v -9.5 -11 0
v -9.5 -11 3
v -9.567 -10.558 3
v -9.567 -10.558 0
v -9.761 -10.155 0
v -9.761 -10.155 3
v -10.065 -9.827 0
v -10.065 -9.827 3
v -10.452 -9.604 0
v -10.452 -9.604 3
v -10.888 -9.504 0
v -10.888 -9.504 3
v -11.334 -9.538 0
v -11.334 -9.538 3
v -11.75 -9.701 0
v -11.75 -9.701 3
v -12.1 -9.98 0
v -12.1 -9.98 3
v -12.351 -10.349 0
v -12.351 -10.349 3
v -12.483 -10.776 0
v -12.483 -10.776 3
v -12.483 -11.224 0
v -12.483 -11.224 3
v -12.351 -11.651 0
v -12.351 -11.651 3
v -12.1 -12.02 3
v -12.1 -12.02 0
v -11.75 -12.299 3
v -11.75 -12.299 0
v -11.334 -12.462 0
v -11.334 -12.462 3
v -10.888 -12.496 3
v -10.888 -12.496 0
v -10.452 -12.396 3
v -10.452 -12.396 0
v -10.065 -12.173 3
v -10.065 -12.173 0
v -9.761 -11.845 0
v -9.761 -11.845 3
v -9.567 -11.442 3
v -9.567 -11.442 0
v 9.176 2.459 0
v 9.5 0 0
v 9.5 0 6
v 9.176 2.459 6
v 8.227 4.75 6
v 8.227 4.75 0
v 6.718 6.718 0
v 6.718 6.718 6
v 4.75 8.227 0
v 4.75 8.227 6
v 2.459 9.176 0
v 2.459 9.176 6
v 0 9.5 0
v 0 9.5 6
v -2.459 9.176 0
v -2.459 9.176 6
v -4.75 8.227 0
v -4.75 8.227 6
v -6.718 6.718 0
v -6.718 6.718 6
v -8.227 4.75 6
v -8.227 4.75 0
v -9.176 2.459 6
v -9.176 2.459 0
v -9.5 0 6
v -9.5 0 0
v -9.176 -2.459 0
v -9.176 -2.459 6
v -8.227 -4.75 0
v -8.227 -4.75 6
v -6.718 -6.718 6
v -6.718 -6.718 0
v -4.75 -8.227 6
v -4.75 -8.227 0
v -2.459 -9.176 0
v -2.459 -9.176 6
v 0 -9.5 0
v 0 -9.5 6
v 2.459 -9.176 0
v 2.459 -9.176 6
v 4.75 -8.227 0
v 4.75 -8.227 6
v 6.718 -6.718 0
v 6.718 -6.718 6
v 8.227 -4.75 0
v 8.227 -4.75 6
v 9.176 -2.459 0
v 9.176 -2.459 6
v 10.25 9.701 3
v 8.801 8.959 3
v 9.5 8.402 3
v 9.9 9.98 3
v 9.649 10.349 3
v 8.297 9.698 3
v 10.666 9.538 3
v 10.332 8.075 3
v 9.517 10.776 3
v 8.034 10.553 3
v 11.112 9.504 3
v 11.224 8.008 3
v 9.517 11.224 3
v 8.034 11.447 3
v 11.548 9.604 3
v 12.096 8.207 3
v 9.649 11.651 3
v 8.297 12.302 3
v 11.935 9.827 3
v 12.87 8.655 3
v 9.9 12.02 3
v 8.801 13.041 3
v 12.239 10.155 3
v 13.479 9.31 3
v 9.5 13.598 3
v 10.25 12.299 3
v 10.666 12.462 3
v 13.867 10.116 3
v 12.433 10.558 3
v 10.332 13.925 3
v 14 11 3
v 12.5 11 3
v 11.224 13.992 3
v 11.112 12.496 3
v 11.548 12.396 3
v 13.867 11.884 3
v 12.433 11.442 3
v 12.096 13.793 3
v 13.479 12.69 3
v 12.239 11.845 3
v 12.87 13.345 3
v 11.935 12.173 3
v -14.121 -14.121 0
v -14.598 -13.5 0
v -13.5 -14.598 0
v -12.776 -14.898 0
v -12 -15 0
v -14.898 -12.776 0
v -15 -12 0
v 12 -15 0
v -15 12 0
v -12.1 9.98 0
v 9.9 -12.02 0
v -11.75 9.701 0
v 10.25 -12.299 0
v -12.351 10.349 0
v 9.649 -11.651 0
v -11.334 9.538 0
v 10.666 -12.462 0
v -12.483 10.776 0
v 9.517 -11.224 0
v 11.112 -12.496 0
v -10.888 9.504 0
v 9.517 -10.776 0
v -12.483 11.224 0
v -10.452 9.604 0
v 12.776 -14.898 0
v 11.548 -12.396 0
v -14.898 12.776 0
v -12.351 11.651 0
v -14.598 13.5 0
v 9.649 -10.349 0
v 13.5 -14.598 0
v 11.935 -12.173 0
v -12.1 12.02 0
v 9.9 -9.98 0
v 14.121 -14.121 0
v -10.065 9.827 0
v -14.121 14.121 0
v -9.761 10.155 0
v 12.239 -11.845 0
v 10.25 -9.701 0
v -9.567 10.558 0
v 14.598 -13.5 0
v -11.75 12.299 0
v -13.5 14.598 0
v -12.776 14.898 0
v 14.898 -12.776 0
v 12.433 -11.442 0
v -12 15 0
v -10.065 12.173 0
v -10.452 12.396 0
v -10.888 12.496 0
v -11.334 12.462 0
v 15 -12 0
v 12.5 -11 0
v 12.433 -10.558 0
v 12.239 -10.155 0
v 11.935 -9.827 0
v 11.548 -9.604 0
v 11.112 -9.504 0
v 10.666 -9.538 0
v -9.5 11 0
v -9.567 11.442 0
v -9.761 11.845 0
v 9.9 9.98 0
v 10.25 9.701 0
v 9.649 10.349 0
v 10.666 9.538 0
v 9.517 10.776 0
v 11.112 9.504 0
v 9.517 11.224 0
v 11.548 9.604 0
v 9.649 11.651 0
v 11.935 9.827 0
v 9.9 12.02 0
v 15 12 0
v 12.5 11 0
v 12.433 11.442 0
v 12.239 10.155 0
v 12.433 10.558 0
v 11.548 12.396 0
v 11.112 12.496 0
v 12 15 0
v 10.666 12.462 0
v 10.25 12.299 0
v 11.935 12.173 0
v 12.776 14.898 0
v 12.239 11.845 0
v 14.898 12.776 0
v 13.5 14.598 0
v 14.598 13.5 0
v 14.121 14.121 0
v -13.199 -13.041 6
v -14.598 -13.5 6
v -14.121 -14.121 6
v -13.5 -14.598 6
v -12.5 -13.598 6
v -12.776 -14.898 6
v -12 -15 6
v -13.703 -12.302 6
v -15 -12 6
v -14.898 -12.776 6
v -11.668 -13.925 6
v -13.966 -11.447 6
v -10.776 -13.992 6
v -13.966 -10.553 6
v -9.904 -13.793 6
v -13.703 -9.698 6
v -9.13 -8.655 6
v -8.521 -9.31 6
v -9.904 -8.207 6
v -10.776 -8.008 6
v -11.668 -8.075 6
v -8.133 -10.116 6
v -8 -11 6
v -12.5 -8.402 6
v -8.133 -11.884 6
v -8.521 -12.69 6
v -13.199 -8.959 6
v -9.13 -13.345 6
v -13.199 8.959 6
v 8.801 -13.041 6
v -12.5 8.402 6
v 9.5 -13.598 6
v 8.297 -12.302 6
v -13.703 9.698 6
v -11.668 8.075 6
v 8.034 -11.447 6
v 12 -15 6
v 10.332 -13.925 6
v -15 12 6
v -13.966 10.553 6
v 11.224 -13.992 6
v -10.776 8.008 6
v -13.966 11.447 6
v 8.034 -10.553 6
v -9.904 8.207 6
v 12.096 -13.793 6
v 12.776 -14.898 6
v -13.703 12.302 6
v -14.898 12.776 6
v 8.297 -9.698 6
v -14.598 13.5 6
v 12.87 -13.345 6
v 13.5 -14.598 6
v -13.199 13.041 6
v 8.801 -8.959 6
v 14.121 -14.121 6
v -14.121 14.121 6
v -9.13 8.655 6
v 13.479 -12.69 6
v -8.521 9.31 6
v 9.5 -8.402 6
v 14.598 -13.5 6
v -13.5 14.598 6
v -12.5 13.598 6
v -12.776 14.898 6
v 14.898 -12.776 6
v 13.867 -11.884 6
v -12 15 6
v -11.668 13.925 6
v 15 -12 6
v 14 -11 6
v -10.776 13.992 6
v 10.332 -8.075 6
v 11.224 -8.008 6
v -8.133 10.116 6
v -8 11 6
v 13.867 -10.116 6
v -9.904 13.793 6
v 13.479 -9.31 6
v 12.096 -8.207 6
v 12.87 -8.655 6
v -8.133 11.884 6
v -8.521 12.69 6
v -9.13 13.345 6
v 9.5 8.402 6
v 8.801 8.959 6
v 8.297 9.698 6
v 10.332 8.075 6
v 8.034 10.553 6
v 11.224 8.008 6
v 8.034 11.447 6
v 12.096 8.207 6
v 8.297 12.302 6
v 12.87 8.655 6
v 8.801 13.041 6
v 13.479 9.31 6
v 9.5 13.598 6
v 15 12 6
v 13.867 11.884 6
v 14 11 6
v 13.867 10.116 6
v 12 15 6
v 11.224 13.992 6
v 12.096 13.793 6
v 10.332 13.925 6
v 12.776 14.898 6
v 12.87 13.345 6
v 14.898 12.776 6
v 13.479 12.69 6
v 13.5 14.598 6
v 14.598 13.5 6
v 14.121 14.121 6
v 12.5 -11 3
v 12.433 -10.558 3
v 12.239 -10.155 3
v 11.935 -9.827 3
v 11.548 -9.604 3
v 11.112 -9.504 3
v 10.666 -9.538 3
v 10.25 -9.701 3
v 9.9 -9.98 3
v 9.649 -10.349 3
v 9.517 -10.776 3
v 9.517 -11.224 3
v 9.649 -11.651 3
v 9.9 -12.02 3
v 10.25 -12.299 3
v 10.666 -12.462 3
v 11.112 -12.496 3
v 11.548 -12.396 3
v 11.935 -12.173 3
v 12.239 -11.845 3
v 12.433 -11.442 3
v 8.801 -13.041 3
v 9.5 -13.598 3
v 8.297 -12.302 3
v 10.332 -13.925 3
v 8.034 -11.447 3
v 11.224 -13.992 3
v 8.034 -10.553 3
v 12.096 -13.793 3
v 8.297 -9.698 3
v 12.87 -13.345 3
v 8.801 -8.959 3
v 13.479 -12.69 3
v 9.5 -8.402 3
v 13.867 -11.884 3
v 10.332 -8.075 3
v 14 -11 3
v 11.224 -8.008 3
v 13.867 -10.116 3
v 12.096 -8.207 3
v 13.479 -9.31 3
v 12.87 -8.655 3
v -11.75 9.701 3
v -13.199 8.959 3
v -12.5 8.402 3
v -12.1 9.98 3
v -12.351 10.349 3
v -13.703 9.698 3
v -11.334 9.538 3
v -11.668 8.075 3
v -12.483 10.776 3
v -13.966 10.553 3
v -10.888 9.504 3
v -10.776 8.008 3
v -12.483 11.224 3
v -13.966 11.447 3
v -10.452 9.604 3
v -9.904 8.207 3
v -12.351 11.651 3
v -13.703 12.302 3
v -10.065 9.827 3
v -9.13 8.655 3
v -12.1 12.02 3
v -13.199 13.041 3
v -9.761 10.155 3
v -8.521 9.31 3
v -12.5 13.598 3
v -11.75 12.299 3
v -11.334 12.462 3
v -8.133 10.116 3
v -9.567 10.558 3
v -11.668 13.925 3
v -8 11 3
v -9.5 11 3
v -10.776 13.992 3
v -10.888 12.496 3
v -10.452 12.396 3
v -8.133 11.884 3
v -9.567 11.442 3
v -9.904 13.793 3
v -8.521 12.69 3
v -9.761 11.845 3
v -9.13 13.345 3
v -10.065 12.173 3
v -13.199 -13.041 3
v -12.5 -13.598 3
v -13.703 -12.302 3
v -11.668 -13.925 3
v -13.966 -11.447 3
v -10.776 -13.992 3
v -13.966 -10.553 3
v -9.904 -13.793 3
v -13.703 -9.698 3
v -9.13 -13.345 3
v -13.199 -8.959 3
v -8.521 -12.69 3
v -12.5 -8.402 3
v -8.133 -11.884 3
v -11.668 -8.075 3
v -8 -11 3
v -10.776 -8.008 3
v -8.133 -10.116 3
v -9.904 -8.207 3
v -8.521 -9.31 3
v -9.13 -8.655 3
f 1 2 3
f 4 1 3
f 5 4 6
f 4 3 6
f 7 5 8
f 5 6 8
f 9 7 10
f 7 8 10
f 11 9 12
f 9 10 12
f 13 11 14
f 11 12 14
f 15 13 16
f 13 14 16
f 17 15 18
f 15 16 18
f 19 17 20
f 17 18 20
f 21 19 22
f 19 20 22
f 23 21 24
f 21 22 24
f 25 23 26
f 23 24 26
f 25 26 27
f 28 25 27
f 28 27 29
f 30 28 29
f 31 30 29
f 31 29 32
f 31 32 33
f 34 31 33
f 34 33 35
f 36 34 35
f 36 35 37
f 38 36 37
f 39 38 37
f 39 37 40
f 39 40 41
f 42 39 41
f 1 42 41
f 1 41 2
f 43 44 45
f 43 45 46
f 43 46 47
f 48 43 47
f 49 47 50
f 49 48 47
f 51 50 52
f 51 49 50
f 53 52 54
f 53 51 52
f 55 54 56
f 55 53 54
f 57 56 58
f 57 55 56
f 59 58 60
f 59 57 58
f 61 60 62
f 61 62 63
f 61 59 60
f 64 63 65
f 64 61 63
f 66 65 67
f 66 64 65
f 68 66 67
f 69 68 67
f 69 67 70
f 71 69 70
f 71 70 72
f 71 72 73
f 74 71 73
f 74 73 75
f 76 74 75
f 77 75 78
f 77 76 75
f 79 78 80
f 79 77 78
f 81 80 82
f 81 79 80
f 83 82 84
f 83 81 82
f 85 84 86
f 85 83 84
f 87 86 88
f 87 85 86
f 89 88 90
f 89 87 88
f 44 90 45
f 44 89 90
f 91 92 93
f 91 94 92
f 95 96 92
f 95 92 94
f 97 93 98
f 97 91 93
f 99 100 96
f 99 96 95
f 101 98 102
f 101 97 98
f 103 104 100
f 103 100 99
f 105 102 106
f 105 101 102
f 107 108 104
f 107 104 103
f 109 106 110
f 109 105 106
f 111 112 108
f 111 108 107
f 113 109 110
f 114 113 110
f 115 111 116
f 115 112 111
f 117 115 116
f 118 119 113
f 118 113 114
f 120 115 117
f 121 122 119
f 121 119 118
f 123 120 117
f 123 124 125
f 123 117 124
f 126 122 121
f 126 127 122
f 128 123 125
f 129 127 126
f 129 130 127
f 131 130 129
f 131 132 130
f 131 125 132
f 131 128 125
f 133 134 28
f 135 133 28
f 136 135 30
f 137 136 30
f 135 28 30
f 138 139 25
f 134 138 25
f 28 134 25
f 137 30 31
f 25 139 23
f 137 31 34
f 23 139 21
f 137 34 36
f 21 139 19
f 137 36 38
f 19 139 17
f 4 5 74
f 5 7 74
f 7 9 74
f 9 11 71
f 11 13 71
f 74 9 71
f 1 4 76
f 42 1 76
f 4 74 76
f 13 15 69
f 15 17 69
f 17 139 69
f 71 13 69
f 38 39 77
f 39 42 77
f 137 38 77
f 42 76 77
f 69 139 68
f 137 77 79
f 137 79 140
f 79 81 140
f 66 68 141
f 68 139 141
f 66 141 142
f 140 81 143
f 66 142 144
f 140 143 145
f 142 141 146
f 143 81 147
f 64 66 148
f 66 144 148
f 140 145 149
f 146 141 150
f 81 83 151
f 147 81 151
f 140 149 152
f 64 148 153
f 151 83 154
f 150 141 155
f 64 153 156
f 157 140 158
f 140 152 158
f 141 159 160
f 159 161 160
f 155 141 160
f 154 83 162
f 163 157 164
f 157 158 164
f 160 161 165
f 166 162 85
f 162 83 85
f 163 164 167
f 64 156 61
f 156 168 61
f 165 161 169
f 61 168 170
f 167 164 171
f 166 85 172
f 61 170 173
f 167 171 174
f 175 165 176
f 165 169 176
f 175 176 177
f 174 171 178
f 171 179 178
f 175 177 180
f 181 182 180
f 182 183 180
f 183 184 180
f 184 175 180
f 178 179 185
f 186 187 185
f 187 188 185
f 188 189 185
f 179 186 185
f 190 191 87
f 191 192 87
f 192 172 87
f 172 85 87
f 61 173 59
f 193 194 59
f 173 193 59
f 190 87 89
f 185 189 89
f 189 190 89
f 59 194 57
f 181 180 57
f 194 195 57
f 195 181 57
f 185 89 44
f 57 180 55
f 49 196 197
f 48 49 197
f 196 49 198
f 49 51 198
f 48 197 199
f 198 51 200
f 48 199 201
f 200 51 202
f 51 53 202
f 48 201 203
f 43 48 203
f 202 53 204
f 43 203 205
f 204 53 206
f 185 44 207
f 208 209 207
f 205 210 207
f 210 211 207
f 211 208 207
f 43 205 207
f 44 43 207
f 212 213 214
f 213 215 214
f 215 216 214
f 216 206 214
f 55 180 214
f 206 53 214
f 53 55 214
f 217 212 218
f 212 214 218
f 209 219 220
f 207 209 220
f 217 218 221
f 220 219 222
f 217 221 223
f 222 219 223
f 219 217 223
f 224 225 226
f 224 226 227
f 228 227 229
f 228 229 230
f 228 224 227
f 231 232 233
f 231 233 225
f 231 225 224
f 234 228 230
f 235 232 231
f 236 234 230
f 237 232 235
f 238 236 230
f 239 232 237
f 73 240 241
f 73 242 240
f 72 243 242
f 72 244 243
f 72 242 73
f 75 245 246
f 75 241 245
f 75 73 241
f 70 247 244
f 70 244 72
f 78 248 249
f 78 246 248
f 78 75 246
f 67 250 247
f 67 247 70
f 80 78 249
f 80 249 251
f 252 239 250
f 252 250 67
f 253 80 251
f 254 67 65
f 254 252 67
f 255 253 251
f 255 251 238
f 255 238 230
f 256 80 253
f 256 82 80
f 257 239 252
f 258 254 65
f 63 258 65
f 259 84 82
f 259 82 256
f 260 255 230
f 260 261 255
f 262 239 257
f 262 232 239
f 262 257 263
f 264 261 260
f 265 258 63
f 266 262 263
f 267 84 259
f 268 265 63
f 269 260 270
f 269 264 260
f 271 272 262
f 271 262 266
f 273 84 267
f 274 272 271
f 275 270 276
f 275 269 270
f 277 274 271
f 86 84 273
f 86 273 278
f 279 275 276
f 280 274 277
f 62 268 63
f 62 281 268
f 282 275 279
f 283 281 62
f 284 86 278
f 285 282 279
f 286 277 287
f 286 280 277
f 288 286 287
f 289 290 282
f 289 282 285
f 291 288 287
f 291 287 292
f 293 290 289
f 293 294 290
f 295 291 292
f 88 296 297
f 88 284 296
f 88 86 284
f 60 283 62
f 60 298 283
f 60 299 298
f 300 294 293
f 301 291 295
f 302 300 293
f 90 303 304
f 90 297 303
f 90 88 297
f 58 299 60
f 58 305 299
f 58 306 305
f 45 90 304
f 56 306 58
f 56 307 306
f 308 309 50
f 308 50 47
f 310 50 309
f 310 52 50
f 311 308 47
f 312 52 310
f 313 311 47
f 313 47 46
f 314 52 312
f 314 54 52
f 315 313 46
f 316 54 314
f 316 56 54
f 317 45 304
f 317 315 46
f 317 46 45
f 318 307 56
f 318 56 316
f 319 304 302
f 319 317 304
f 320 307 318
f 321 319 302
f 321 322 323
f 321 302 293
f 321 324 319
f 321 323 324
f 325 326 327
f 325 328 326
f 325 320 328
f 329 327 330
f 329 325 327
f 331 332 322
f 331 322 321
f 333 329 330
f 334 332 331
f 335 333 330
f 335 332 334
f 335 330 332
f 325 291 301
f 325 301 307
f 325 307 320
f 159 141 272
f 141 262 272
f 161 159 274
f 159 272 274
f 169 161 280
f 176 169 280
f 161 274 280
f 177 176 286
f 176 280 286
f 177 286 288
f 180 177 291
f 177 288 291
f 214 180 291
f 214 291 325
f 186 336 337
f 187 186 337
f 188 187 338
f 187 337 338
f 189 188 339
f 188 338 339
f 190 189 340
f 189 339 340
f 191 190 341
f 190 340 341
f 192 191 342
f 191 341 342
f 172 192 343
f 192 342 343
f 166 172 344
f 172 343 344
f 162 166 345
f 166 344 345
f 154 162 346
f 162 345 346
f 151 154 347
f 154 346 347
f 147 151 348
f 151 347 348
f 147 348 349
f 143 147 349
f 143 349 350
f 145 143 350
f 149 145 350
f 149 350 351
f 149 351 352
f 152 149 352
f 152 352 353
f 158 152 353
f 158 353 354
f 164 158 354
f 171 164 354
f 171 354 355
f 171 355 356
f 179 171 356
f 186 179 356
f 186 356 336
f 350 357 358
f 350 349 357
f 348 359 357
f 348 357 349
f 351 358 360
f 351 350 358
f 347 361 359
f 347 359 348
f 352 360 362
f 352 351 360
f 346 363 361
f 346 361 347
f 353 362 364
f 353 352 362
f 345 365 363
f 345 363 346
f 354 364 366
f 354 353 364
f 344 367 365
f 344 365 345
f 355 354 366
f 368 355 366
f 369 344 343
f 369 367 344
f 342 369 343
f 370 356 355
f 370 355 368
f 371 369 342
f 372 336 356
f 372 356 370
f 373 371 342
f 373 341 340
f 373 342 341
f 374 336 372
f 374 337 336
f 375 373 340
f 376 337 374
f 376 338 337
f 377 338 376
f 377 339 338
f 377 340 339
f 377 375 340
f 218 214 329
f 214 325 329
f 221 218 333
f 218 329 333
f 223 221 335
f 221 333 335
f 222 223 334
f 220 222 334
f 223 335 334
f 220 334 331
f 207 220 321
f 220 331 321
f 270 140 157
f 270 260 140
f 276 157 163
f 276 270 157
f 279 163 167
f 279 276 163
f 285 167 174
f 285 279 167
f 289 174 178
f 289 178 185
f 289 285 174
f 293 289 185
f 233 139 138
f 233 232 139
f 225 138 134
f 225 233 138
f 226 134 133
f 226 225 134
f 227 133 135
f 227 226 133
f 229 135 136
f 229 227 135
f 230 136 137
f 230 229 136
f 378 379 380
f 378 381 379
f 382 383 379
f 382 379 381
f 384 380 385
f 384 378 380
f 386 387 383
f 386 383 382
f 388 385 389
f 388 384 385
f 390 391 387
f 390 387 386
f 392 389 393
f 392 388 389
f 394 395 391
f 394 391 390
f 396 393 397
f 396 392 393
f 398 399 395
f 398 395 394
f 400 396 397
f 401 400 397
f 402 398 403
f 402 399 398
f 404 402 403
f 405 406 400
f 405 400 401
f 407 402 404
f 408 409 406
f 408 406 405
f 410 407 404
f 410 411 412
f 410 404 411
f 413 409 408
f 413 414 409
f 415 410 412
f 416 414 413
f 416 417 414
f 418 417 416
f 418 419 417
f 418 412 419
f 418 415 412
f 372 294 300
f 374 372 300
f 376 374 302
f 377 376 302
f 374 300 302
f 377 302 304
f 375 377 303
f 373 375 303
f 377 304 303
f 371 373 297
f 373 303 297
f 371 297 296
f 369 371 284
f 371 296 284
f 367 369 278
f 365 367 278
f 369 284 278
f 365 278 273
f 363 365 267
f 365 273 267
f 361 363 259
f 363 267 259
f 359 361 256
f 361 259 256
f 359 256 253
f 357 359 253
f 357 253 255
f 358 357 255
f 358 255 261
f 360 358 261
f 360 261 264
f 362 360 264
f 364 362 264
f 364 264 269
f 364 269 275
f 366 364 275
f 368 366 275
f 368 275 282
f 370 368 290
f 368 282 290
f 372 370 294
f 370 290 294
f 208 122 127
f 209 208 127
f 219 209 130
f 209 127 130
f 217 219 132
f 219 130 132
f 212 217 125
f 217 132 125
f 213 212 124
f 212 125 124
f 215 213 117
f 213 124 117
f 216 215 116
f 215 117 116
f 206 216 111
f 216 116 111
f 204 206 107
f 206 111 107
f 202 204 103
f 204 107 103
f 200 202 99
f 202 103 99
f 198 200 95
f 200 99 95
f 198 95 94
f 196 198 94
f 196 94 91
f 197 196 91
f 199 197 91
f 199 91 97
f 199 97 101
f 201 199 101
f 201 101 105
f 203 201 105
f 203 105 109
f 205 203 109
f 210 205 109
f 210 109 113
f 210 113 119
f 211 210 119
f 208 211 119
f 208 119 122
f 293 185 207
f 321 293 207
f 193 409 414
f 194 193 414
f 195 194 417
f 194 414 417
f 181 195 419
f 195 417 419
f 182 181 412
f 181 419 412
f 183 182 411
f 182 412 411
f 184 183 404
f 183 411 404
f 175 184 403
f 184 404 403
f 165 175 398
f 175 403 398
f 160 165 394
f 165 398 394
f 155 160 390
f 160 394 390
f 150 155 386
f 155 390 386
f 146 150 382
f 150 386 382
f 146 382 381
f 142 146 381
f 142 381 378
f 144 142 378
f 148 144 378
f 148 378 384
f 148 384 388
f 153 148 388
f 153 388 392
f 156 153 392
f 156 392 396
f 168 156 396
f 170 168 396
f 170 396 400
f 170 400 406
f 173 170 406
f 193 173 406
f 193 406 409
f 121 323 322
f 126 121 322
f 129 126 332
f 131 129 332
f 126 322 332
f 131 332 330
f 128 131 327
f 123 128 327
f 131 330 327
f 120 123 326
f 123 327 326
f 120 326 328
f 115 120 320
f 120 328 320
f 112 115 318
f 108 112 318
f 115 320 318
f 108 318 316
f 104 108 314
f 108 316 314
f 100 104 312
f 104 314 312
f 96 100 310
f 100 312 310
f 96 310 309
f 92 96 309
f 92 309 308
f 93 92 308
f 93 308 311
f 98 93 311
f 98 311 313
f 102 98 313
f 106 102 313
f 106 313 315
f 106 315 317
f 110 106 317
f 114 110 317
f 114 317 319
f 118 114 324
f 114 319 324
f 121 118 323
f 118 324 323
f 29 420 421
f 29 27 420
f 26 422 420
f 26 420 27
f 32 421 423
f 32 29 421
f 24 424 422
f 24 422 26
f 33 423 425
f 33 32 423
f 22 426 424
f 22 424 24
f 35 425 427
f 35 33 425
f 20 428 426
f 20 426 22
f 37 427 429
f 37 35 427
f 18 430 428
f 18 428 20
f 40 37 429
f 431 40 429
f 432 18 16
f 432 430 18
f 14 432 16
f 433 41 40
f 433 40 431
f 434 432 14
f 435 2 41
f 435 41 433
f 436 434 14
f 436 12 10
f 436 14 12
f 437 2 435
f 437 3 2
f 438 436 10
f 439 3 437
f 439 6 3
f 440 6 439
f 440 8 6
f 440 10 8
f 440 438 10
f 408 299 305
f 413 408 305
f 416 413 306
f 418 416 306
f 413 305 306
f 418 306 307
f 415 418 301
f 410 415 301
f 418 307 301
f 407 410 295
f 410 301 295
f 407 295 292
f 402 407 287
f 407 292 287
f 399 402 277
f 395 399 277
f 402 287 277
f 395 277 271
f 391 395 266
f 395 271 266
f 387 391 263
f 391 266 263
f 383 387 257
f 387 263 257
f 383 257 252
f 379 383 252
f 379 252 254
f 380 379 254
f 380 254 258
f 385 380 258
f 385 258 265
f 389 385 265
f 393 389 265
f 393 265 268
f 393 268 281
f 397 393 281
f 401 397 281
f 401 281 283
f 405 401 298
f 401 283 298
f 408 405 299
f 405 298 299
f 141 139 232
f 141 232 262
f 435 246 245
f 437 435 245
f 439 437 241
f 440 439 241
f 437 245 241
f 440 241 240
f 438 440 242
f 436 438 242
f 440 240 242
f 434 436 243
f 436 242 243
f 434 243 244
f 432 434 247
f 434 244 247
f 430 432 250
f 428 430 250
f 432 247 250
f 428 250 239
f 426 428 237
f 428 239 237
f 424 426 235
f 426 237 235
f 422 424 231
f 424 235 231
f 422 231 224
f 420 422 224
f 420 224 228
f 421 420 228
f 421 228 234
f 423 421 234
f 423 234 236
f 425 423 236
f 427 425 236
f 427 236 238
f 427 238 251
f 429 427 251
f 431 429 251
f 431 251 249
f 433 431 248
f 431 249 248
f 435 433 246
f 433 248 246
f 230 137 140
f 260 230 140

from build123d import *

# Parameters (mm, degrees)
SKETCH1_W           = 30
SKETCH1_H           = 30
SKETCH1_R           = 9.5
BOSS_EXTRUDE1_DEPTH = 6
SKETCH3_R           = 1.5
CUT_EXTRUDE2_DEPTH  = 7
SKETCH4_R           = 3
CUT_EXTRUDE3_DEPTH  = 3
FILLET1_R           = 3


with BuildPart() as part:
    # Sketch1 → Boss-Extrude1 (new body)
    with BuildSketch(Plane.XY):
        Rectangle(SKETCH1_W, SKETCH1_H)
        Circle(SKETCH1_R, mode=Mode.SUBTRACT)
    extrude(amount=BOSS_EXTRUDE1_DEPTH)

    # Sketch3 → Cut-Extrude2 (cut, through all)
    with BuildSketch(Plane.XY.offset(6)):
        with Locations((-11, 11)):
            Circle(SKETCH3_R)
        with Locations((11, 11)):
            Circle(SKETCH3_R)
        with Locations((11, -11)):
            Circle(SKETCH3_R)
        with Locations((-11, -11)):
            Circle(SKETCH3_R)
    extrude(amount=-CUT_EXTRUDE2_DEPTH, mode=Mode.SUBTRACT)

    # Sketch4 → Cut-Extrude3 (cut)
    with BuildSketch(Plane.XY.offset(6)):
        with Locations((-11, 11)):
            Circle(SKETCH4_R)
        with Locations((11, 11)):
            Circle(SKETCH4_R)
        with Locations((11, -11)):
            Circle(SKETCH4_R)
        with Locations((-11, -11)):
            Circle(SKETCH4_R)
    extrude(amount=-CUT_EXTRUDE3_DEPTH, mode=Mode.SUBTRACT)

    # Fillet1
    fillet1_edges = [part.edges().sort_by_distance(p)[0] for p in [
        (15, -15, 3),
        (-15, -15, 3),
        (-15, 15, 3),
        (15, 15, 3),
    ]]
    fillet(fillet1_edges, radius=FILLET1_R)


solid = part.part
